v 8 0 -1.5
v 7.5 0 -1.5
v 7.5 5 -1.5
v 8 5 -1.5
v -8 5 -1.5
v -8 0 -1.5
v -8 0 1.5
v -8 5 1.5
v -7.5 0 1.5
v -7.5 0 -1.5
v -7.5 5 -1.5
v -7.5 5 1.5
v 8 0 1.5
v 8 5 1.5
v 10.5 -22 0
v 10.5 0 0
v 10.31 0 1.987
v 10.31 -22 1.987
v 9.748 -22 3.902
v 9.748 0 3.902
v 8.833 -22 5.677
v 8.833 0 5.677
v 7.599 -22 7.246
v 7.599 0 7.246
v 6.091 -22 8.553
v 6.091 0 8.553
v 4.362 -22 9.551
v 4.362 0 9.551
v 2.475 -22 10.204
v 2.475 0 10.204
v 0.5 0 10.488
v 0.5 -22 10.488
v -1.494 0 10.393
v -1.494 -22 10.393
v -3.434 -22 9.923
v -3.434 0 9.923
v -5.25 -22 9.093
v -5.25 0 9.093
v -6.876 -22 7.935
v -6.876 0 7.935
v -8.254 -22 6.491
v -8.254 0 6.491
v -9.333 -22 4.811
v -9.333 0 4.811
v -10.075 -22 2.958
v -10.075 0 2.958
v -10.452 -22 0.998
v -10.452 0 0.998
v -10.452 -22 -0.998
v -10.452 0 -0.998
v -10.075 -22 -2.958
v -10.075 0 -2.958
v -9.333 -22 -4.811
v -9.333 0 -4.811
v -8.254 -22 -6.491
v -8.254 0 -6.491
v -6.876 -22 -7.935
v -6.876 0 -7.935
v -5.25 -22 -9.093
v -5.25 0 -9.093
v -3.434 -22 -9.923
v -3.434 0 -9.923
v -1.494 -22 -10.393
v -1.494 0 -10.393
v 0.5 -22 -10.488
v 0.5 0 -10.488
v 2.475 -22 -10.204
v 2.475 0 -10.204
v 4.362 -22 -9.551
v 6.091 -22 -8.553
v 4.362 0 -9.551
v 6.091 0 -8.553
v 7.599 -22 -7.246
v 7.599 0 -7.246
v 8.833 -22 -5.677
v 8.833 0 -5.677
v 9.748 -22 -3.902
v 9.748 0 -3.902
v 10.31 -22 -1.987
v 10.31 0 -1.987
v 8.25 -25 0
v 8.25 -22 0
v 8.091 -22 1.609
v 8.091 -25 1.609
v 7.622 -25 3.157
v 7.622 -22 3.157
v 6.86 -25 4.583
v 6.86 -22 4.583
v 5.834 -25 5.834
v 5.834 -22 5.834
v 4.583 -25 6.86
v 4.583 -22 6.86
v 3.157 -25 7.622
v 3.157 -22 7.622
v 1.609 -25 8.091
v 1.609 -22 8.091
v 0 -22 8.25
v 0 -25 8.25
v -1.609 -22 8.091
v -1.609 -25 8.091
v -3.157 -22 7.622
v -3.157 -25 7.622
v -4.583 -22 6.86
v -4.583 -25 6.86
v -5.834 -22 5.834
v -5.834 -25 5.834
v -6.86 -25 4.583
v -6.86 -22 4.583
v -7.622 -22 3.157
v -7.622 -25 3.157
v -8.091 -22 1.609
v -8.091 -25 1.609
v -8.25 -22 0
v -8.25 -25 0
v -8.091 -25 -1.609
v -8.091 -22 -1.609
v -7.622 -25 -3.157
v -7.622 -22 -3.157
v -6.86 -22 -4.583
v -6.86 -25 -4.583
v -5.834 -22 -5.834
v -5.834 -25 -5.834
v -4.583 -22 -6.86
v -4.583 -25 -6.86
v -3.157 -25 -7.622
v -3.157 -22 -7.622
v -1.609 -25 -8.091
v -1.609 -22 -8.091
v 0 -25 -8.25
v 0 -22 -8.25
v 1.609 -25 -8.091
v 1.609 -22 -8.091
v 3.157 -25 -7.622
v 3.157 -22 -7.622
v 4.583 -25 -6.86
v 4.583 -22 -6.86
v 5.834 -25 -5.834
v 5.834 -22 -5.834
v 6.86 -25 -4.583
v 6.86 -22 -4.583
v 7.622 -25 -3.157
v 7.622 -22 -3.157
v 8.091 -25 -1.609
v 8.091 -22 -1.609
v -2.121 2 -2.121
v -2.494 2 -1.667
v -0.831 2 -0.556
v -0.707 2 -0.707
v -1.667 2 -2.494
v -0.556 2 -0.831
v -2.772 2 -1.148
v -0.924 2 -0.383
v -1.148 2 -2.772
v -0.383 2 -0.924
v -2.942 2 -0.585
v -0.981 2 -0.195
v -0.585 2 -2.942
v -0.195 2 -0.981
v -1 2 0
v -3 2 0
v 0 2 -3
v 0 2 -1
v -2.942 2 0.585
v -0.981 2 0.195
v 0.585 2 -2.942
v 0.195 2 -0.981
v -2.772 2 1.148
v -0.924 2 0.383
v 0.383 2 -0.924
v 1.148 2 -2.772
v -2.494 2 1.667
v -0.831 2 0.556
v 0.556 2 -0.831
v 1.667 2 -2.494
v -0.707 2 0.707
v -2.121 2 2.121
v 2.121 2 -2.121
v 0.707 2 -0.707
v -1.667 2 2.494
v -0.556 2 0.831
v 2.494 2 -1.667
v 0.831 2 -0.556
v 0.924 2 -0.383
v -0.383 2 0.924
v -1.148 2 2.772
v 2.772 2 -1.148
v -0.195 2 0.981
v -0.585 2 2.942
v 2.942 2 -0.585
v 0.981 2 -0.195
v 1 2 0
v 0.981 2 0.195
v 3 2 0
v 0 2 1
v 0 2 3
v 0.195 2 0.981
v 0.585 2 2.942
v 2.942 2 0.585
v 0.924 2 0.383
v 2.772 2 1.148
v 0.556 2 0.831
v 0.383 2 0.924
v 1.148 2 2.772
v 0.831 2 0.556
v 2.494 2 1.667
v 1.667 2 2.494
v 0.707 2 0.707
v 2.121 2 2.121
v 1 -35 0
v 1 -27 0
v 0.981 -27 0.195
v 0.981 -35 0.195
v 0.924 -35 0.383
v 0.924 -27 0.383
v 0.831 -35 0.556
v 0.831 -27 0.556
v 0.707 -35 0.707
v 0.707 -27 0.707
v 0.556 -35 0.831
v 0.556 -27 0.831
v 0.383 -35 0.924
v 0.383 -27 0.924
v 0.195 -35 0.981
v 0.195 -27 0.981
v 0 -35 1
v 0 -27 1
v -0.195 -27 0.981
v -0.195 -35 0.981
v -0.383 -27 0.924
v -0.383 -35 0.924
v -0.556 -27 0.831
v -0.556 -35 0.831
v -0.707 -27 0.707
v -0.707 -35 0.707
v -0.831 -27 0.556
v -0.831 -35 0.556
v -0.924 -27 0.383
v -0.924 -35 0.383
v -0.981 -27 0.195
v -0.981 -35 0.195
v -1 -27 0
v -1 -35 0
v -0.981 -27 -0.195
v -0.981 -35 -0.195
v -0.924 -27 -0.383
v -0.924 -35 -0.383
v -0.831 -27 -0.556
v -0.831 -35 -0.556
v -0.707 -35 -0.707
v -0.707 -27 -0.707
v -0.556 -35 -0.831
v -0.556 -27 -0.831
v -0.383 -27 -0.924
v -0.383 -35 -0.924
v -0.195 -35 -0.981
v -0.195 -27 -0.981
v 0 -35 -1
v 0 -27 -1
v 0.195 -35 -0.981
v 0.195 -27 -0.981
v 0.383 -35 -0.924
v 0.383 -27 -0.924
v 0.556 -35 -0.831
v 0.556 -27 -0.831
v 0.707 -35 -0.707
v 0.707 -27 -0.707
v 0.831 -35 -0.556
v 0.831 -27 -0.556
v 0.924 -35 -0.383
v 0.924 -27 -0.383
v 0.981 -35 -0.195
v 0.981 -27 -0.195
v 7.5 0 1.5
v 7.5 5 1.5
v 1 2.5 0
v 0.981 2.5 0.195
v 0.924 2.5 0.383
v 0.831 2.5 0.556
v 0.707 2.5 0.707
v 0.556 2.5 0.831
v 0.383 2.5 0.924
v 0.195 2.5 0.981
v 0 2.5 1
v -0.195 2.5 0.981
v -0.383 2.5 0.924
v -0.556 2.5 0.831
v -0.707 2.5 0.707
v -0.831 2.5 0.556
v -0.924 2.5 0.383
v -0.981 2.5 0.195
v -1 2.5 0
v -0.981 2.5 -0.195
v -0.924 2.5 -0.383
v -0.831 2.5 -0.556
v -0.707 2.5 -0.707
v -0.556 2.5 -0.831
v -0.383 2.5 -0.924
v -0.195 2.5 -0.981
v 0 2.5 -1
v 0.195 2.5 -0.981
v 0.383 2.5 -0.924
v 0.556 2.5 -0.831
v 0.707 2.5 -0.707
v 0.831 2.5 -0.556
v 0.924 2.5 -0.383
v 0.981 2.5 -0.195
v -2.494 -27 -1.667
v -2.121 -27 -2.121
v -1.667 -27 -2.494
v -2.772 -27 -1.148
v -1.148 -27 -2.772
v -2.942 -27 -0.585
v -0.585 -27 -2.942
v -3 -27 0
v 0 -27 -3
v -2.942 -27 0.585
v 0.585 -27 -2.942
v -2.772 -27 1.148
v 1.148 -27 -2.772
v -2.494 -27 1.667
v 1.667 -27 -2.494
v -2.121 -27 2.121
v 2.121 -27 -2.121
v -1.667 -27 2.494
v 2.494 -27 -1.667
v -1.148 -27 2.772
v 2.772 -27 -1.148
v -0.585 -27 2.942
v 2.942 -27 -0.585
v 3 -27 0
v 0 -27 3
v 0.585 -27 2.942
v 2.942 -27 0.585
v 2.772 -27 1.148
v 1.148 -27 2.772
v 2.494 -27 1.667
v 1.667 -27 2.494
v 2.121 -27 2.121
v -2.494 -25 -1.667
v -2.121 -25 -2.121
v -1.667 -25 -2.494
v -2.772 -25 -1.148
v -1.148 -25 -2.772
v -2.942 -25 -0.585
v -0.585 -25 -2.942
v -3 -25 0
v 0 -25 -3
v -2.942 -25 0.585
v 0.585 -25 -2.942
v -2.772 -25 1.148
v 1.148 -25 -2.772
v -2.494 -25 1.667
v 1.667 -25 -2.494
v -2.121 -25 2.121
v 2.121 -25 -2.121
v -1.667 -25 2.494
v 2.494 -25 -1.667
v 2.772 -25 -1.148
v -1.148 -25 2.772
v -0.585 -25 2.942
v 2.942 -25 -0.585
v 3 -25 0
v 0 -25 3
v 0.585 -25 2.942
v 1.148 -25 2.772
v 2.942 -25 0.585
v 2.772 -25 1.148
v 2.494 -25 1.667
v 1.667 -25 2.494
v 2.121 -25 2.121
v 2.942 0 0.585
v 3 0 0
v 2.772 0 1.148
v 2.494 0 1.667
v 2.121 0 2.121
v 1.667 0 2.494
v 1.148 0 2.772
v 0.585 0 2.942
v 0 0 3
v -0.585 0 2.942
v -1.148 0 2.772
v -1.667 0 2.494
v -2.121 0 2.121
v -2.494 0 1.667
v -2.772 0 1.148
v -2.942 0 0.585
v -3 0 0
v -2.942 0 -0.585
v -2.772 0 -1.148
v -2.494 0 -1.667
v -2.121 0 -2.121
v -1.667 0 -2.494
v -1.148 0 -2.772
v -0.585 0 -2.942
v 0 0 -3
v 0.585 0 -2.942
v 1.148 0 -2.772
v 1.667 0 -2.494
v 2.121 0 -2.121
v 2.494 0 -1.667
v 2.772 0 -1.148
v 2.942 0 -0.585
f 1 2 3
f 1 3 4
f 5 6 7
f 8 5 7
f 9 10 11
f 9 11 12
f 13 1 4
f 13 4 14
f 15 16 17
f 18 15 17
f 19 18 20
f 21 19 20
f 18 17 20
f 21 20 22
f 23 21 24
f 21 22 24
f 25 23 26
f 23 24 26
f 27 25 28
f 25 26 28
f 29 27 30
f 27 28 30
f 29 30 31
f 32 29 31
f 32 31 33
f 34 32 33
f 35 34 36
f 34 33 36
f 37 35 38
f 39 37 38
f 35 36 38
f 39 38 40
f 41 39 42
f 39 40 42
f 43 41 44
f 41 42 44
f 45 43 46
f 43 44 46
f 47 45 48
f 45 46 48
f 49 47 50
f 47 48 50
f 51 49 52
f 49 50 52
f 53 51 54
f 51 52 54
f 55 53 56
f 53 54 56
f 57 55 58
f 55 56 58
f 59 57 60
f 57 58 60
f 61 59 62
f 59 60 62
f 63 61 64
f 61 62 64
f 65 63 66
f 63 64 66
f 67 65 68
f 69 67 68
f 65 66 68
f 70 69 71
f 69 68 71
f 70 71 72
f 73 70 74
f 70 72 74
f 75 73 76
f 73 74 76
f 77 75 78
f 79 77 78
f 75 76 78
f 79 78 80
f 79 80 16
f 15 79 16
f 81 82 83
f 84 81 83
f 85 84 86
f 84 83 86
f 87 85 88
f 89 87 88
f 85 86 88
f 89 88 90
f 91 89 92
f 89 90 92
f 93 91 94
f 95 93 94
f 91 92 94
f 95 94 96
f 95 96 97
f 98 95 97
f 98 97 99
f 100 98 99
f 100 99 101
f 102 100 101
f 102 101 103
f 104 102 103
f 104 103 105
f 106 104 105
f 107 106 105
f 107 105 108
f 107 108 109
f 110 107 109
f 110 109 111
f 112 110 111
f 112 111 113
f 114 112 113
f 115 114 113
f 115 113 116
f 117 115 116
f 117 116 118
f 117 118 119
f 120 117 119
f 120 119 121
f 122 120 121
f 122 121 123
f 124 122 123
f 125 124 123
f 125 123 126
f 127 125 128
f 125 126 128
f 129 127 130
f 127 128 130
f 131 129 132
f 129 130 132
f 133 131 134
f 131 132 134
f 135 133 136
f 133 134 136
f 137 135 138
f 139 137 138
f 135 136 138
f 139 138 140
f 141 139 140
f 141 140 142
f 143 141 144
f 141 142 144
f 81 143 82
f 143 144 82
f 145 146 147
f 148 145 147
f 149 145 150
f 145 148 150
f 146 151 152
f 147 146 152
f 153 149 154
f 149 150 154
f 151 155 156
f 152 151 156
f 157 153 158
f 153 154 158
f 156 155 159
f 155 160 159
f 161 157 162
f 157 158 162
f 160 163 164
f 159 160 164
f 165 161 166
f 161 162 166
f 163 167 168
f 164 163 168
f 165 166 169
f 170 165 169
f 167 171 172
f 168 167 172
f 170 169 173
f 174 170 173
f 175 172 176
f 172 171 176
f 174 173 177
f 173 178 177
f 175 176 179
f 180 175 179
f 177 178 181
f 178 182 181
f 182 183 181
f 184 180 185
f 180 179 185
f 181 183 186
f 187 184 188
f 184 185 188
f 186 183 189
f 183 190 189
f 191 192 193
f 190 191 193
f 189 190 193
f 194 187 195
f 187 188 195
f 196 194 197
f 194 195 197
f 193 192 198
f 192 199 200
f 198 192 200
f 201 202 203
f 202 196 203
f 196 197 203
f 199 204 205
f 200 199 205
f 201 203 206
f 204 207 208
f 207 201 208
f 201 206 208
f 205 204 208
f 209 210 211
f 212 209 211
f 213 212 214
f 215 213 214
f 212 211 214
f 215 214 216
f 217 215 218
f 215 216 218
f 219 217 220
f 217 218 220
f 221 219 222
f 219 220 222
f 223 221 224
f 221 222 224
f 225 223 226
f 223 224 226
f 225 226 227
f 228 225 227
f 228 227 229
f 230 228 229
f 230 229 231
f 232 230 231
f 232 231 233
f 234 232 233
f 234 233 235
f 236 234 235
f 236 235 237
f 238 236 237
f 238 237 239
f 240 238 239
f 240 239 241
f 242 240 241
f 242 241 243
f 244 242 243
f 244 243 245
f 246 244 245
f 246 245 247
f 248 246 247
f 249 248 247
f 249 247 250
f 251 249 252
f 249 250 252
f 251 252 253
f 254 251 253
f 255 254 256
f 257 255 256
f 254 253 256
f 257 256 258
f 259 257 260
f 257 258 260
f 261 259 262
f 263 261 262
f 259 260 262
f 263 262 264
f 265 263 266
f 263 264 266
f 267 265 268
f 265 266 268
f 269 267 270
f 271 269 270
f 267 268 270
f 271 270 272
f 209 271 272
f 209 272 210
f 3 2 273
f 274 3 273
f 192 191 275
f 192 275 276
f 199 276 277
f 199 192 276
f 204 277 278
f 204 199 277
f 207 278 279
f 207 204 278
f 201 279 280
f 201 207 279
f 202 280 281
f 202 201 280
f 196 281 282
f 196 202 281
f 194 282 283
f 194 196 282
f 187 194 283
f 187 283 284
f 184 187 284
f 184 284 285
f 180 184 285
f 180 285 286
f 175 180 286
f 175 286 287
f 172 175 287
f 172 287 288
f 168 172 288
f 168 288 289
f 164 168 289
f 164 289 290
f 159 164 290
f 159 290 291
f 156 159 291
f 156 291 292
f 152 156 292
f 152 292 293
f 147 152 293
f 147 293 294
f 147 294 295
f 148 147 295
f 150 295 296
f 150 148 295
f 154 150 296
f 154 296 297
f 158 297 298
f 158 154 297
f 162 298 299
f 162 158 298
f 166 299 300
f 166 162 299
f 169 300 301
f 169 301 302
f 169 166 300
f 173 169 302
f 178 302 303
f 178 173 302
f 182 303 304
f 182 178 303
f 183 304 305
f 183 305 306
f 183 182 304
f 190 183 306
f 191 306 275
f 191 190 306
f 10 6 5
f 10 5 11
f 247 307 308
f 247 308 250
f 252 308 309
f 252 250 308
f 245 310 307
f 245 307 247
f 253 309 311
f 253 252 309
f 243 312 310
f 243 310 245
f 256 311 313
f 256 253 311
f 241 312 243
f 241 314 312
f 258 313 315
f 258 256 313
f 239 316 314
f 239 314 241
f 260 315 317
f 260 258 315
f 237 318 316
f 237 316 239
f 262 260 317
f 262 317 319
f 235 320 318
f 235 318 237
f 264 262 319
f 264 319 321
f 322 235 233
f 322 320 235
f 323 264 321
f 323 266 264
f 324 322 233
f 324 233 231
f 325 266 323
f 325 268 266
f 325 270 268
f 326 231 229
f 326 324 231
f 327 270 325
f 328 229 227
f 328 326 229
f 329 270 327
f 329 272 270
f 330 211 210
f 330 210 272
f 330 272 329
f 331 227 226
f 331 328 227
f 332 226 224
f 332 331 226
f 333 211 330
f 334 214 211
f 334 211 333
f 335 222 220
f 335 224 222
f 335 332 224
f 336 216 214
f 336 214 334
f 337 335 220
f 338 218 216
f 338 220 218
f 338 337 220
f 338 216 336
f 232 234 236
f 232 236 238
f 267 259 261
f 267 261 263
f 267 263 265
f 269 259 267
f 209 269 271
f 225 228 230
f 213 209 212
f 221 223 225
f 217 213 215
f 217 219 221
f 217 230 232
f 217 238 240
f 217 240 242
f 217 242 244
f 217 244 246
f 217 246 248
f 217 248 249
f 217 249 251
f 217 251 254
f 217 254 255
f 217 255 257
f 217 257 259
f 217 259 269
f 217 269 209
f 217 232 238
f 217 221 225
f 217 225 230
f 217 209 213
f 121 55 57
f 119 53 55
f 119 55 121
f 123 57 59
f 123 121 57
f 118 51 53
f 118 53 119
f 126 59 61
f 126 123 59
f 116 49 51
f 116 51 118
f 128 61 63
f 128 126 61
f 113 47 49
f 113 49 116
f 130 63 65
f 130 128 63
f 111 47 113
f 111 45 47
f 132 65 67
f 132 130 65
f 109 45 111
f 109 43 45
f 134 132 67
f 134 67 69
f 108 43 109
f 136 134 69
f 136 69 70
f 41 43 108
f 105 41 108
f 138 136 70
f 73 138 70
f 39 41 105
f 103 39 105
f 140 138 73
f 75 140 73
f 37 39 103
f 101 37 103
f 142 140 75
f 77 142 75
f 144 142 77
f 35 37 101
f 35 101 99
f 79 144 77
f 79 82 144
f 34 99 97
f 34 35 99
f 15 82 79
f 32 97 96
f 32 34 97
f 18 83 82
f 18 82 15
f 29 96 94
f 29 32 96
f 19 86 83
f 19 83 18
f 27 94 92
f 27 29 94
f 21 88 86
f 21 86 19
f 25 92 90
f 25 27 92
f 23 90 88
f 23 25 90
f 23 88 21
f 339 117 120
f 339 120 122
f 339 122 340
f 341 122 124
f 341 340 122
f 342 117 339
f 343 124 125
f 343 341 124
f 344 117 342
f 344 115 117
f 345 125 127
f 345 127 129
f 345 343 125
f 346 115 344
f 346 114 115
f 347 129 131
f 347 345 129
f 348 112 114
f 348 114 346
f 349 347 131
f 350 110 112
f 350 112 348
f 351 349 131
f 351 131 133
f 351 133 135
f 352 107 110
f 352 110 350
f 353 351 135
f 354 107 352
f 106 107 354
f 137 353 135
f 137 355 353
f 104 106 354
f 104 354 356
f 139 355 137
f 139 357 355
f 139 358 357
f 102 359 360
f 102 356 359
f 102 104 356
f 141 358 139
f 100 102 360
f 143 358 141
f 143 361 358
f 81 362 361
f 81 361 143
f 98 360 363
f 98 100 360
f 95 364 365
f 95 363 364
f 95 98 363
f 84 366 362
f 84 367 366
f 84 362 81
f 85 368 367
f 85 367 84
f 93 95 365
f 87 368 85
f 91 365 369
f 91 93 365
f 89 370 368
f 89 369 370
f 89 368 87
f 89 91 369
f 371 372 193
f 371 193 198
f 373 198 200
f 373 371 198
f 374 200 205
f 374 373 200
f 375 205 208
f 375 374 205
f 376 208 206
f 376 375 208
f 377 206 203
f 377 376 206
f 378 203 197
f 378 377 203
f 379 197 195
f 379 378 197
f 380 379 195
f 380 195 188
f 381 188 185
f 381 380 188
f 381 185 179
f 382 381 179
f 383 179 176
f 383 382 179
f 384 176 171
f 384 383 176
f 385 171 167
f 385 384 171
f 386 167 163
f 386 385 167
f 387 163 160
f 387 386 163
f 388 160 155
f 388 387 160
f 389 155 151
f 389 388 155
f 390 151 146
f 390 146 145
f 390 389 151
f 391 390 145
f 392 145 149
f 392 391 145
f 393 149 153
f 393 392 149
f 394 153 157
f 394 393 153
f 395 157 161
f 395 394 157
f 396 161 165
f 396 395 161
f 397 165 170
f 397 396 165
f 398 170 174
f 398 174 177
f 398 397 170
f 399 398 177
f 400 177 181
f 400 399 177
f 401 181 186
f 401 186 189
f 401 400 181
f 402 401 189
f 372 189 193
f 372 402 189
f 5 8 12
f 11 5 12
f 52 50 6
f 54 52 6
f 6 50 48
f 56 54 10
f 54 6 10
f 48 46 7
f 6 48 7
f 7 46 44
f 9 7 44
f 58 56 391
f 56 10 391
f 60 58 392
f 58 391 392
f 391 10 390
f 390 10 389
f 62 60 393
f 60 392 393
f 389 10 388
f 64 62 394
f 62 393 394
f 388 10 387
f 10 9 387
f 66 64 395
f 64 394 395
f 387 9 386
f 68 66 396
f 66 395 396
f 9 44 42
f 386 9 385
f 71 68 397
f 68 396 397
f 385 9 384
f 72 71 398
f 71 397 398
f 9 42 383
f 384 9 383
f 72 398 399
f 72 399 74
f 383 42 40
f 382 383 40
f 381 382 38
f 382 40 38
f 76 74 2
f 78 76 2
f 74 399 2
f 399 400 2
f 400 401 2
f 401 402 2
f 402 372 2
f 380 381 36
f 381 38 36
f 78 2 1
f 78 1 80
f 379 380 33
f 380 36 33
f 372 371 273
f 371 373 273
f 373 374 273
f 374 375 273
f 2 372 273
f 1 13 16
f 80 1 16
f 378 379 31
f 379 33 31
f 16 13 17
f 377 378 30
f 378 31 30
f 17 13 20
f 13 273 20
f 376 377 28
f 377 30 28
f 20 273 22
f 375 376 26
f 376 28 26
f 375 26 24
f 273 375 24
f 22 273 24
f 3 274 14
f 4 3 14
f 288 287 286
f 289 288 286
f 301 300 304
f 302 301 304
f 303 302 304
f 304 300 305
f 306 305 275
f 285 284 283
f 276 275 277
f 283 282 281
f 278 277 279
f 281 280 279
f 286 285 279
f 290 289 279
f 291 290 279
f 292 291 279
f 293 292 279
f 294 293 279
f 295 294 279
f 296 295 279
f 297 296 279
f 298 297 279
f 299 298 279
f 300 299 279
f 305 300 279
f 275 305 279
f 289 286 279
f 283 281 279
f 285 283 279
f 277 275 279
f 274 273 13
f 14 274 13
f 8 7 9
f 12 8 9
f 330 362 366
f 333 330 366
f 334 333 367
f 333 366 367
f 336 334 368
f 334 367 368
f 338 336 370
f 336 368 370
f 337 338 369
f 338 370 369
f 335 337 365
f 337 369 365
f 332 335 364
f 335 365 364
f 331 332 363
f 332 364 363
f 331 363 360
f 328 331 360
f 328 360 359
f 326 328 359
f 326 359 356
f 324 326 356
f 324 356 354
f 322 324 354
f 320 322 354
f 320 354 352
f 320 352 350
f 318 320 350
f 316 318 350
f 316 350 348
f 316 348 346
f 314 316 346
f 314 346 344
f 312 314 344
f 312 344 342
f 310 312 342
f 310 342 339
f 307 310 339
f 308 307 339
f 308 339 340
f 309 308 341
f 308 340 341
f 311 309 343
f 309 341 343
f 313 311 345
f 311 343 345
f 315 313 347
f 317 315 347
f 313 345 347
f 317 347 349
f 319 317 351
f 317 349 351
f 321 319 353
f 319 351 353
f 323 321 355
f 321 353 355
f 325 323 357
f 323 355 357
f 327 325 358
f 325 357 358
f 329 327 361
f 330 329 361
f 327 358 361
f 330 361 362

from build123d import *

# Parameters (mm, degrees)
F0_R          = 10.5
F0_R_2        = 8.25
F1_DEPTH      = 22
F0_W          = 0.5
F0_H          = 3
F0_R_3        = 3
F2_DEPTH      = 25
F0_R_4        = 1
F3_DEPTH      = 27
F3_DEPTH_BACK = 2
F4_DEPTH      = 35
F4_DEPTH_BACK = 2.5
F5_DEPTH      = 5


with BuildPart() as f1:
    # F0 (on Front) → F1 (new body)
    with BuildSketch(Plane.XZ):
        Circle(F0_R)
        Circle(F0_R_2, mode=Mode.SUBTRACT)
    extrude(amount=F1_DEPTH)

    # F0 (on Front) → F2 (join)
    with BuildSketch(Plane.XZ):
        Circle(F0_R_2)
        with Locations((-7.75, 0)):
            Rectangle(F0_W, F0_H, mode=Mode.SUBTRACT)
        Circle(F0_R_3, mode=Mode.SUBTRACT)
        with Locations((7.75, 0)):
            Rectangle(F0_W, F0_H, mode=Mode.SUBTRACT)
        with Locations((-7.75, 0)):
            Rectangle(F0_W, F0_H)
        with Locations((7.75, 0)):
            Rectangle(F0_W, F0_H)
    extrude(amount=F2_DEPTH)

    # F0 (on Front) → F3 (join, two sides)
    with BuildSketch(Plane.XZ) as f3_sk:
        Circle(F0_R_3)
        Circle(F0_R_4, mode=Mode.SUBTRACT)
    extrude(amount=F3_DEPTH)
    extrude(f3_sk.sketch, amount=-F3_DEPTH_BACK)

    # F0 (on Front) → F4 (join, two sides)
    with BuildSketch(Plane.XZ) as f4_sk:
        Circle(F0_R_4)
    extrude(amount=F4_DEPTH)
    extrude(f4_sk.sketch, amount=-F4_DEPTH_BACK)

    # F0 (on Front) → F5 (join)
    with BuildSketch(Plane.XZ):
        with Locations((-7.75, 0)):
            Rectangle(F0_W, F0_H)
        with Locations((7.75, 0)):
            Rectangle(F0_W, F0_H)
    extrude(amount=-F5_DEPTH)


solid = f1.part
